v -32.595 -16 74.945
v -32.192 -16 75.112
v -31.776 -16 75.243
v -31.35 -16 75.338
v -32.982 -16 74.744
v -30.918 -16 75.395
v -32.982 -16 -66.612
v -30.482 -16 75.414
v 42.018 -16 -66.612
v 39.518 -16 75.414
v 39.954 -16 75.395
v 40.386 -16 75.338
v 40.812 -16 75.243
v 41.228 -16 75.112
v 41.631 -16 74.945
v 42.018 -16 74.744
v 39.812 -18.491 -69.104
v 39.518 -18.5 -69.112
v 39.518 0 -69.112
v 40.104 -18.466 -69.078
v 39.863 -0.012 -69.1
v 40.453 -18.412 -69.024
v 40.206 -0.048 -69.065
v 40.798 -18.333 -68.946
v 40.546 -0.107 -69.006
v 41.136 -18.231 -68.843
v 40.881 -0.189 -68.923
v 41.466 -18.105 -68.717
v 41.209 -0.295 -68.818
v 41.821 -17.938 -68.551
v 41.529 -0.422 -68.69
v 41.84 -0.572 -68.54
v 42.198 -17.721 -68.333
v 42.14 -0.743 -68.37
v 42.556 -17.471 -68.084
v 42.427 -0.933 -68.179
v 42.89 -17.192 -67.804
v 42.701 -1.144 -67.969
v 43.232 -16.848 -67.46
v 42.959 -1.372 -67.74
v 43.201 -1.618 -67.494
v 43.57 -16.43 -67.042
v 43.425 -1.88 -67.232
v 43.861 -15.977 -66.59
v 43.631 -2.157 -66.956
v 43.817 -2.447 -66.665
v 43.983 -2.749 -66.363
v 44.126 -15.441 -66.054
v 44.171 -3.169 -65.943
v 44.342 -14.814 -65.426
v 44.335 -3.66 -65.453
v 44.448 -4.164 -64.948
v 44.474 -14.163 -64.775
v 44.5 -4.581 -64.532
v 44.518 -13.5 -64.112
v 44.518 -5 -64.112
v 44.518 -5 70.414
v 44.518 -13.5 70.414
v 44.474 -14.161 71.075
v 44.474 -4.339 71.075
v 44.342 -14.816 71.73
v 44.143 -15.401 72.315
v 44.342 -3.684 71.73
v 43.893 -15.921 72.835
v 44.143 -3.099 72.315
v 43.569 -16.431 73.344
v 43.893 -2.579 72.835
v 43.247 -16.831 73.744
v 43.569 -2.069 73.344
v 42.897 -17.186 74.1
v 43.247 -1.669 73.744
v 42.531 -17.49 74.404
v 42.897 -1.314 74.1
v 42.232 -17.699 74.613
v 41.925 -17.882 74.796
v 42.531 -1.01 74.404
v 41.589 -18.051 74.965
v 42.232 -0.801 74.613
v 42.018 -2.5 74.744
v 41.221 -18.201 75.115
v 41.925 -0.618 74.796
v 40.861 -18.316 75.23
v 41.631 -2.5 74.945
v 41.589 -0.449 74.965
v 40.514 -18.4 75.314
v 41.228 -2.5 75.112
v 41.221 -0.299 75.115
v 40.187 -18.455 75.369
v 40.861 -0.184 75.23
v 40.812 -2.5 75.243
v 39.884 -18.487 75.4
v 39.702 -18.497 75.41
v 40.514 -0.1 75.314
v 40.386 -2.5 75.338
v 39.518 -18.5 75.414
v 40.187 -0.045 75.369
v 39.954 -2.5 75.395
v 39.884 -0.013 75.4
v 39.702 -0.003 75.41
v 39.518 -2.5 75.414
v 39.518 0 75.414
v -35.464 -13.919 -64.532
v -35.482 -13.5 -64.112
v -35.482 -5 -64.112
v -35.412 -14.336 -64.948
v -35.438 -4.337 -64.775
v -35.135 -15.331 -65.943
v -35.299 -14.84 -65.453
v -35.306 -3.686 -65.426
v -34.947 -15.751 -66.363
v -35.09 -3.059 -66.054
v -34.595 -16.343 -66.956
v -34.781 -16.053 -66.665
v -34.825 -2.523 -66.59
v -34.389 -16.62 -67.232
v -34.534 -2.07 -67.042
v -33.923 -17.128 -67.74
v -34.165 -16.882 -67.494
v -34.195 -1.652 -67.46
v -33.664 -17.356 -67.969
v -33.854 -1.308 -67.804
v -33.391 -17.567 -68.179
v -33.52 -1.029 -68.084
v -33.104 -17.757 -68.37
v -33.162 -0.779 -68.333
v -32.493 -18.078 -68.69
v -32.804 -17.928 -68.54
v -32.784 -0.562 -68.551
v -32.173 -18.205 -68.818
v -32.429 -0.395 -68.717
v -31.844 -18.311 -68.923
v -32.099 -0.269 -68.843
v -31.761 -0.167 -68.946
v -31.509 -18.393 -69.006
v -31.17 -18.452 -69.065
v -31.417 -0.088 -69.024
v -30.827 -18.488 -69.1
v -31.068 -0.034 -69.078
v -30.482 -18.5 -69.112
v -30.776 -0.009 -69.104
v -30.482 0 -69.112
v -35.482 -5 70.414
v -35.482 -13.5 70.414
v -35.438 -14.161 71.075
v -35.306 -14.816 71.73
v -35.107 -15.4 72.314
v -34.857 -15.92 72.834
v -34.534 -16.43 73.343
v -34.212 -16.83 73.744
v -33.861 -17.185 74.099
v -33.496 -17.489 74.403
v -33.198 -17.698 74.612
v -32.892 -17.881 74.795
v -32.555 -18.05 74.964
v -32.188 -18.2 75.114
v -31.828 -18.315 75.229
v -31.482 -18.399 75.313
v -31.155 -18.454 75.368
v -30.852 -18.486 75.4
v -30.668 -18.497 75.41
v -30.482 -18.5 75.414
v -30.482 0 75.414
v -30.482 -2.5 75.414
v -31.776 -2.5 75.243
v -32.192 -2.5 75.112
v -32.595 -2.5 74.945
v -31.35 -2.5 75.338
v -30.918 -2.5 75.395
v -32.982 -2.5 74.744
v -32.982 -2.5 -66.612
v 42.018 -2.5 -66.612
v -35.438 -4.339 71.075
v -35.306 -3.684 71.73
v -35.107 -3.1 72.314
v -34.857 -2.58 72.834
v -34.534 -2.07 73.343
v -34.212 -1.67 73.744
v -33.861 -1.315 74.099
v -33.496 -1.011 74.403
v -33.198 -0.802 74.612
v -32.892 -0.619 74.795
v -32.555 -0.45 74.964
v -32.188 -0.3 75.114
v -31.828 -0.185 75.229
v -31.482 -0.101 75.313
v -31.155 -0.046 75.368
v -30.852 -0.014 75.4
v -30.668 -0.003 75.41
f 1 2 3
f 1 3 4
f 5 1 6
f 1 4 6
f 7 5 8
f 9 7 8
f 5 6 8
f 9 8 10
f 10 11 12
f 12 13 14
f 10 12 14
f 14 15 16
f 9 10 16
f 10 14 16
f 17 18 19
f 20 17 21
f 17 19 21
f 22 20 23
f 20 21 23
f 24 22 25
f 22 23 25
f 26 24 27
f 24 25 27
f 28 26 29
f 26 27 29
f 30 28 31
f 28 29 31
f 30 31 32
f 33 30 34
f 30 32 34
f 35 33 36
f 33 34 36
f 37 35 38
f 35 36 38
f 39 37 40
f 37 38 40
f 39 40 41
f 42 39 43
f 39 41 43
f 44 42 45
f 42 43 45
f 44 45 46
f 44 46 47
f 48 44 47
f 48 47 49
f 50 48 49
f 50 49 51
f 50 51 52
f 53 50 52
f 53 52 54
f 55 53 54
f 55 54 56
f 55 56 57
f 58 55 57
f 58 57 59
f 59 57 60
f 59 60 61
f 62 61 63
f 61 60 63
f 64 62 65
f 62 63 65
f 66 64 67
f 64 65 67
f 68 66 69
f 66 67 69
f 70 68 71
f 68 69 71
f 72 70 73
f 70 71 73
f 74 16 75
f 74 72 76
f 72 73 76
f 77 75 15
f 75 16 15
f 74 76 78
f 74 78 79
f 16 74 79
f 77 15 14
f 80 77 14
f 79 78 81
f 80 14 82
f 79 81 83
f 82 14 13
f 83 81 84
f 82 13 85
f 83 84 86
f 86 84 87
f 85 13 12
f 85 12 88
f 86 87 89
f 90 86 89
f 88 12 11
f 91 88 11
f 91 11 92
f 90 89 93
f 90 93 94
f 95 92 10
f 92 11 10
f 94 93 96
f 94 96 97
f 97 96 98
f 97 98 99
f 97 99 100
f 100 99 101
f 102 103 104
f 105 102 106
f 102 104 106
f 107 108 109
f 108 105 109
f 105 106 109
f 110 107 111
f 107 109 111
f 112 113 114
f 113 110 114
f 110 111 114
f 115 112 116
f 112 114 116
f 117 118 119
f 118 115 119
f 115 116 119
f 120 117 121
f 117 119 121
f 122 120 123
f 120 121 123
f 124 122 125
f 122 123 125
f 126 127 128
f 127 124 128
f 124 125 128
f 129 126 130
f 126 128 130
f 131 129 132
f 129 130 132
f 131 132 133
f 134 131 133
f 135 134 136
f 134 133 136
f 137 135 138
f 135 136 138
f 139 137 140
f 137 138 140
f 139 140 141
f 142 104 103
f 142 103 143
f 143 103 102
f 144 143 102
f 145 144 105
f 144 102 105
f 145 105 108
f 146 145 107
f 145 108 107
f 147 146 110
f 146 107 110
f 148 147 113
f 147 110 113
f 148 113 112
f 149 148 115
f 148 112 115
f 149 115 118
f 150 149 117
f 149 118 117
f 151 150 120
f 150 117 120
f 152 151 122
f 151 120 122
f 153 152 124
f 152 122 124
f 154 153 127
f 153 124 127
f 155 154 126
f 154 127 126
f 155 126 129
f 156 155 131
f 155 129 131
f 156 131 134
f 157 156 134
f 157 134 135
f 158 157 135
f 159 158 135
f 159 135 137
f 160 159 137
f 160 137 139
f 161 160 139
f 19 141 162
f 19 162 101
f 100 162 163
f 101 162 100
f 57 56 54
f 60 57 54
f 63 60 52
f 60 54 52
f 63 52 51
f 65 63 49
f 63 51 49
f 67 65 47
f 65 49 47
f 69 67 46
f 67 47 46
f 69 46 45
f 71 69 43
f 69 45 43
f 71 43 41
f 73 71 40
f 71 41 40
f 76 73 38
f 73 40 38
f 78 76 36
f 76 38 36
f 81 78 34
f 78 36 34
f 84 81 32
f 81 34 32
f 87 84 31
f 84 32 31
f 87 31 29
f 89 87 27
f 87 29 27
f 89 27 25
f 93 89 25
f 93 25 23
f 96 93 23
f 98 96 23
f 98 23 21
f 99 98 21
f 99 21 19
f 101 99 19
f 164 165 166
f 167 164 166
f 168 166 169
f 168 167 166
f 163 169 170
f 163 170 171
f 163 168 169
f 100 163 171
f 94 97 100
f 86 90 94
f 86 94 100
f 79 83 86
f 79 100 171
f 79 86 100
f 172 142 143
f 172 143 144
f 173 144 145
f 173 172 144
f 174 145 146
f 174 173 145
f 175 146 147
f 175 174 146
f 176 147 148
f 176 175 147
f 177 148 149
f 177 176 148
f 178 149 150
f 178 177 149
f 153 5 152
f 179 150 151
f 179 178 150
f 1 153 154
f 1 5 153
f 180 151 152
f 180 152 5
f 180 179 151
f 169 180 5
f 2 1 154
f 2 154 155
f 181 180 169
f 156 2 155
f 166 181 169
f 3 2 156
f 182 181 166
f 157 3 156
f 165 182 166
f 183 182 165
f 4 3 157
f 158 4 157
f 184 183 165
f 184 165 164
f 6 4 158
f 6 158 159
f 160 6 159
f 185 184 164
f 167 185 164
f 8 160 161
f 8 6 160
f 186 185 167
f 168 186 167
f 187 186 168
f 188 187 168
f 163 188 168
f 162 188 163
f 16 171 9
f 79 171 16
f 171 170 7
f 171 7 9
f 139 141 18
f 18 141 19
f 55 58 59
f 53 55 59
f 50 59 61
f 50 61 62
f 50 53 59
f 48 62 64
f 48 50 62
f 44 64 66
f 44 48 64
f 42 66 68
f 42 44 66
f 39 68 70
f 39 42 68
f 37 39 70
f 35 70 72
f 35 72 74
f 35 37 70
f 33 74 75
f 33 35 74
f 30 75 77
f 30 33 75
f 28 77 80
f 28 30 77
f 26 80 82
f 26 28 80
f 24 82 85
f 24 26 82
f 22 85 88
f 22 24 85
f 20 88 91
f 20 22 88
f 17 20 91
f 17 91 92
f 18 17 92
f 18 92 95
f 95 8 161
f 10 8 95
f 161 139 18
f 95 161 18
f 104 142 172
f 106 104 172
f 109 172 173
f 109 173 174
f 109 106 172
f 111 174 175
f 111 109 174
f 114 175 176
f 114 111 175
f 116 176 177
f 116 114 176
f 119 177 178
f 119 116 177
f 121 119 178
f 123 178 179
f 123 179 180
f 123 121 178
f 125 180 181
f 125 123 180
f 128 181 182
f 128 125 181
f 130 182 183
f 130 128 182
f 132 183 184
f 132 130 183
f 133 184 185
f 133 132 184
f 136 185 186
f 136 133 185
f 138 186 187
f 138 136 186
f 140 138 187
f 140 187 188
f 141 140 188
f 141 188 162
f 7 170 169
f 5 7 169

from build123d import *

# Parameters (mm, degrees)
F0_W        = 80
F0_H        = 144.526
F1_DEPTH    = 18.5
F2_T        = -2.5
F3_T1_DEPTH = 169.526
F3_T3_DEPTH = 43.5


# Not quite as in the source:
# - a fillet or chamfer that OpenCascade refuses, or shapes differently, is made with other operations: its cross-section is extruded or revolved along the edge and cut away or added


with BuildPart() as f1:
    # F0 (on Front) → F1 (new body)
    with BuildSketch(Plane.XZ):
        with Locations((4.5181000233, 3.1507380013)):
            Rectangle(F0_W, F0_H)
    extrude(amount=F1_DEPTH)

    # F2
    f2_openings = [f1.faces().sort_by_distance(p)[0] for p in [
        (4.5181, -9.25, 75.413738),
    ]]
    offset(amount=F2_T, openings=f2_openings)

    # F3: fillet of radius 5 on 8 edges, made by hand

    # F3_s2 → F3_t1 (cut)
    with BuildSketch(Plane.XY.offset(-81.6122619987)):
        with BuildLine():
            ThreePointArc((-35.4818999767, -13.5), (-34.0174338827, -17.0355339059), (-30.4818999767, -18.5))
            Line((-30.4818999767, -18.5), (-35.4818999767, -18.5))
            Line((-35.4818999767, -18.5), (-35.4818999767, -13.5))
        make_face()
        with BuildLine():
            ThreePointArc((-35.4818999767, -5), (-34.0174338827, -1.4644660941), (-30.4818999767, 0))
            Line((-30.4818999767, 0), (-35.4818999767, 0))
            Line((-35.4818999767, 0), (-35.4818999767, -5))
        make_face()
        with BuildLine():
            ThreePointArc((44.5181000233, -13.5), (43.0536339292, -17.0355339059), (39.5181000233, -18.5))
            Line((39.5181000233, -18.5), (44.5181000233, -18.5))
            Line((44.5181000233, -18.5), (44.5181000233, -13.5))
        make_face()
        with BuildLine():
            ThreePointArc((44.5181000233, -5), (43.0536339292, -1.4644660941), (39.5181000233, 0))
            Line((39.5181000233, 0), (44.5181000233, 0))
            Line((44.5181000233, 0), (44.5181000233, -5))
        make_face()
    extrude(amount=F3_T1_DEPTH, mode=Mode.SUBTRACT)

    # F3_s4 → F3_t3 (cut)
    with BuildSketch(Plane.XZ.offset(-12.5)):
        with BuildLine():
            ThreePointArc((44.5181000233, 70.4137380013), (43.0536339292, 73.9492719073), (39.5181000233, 75.4137380013))
            Line((39.5181000233, 75.4137380013), (44.5181000233, 75.4137380013))
            Line((44.5181000233, 75.4137380013), (44.5181000233, 70.4137380013))
        make_face()
        with BuildLine():
            ThreePointArc((-35.4818999767, 70.4137380013), (-34.0174338827, 73.9492719073), (-30.4818999767, 75.4137380013))
            Line((-30.4818999767, 75.4137380013), (-35.4818999767, 75.4137380013))
            Line((-35.4818999767, 75.4137380013), (-35.4818999767, 70.4137380013))
        make_face()
        with BuildLine():
            ThreePointArc((-35.4818999767, -64.1122619987), (-34.0174338827, -67.6477959046), (-30.4818999767, -69.1122619987))
            Line((-30.4818999767, -69.1122619987), (-35.4818999767, -69.1122619987))
            Line((-35.4818999767, -69.1122619987), (-35.4818999767, -64.1122619987))
        make_face()
        with BuildLine():
            ThreePointArc((39.5181000233, -69.1122619987), (43.0536339292, -67.6477959046), (44.5181000233, -64.1122619987))
            Line((44.5181000233, -64.1122619987), (44.5181000233, -69.1122619987))
            Line((44.5181000233, -69.1122619987), (39.5181000233, -69.1122619987))
        make_face()
    extrude(amount=F3_T3_DEPTH, mode=Mode.SUBTRACT)


solid = f1.part
